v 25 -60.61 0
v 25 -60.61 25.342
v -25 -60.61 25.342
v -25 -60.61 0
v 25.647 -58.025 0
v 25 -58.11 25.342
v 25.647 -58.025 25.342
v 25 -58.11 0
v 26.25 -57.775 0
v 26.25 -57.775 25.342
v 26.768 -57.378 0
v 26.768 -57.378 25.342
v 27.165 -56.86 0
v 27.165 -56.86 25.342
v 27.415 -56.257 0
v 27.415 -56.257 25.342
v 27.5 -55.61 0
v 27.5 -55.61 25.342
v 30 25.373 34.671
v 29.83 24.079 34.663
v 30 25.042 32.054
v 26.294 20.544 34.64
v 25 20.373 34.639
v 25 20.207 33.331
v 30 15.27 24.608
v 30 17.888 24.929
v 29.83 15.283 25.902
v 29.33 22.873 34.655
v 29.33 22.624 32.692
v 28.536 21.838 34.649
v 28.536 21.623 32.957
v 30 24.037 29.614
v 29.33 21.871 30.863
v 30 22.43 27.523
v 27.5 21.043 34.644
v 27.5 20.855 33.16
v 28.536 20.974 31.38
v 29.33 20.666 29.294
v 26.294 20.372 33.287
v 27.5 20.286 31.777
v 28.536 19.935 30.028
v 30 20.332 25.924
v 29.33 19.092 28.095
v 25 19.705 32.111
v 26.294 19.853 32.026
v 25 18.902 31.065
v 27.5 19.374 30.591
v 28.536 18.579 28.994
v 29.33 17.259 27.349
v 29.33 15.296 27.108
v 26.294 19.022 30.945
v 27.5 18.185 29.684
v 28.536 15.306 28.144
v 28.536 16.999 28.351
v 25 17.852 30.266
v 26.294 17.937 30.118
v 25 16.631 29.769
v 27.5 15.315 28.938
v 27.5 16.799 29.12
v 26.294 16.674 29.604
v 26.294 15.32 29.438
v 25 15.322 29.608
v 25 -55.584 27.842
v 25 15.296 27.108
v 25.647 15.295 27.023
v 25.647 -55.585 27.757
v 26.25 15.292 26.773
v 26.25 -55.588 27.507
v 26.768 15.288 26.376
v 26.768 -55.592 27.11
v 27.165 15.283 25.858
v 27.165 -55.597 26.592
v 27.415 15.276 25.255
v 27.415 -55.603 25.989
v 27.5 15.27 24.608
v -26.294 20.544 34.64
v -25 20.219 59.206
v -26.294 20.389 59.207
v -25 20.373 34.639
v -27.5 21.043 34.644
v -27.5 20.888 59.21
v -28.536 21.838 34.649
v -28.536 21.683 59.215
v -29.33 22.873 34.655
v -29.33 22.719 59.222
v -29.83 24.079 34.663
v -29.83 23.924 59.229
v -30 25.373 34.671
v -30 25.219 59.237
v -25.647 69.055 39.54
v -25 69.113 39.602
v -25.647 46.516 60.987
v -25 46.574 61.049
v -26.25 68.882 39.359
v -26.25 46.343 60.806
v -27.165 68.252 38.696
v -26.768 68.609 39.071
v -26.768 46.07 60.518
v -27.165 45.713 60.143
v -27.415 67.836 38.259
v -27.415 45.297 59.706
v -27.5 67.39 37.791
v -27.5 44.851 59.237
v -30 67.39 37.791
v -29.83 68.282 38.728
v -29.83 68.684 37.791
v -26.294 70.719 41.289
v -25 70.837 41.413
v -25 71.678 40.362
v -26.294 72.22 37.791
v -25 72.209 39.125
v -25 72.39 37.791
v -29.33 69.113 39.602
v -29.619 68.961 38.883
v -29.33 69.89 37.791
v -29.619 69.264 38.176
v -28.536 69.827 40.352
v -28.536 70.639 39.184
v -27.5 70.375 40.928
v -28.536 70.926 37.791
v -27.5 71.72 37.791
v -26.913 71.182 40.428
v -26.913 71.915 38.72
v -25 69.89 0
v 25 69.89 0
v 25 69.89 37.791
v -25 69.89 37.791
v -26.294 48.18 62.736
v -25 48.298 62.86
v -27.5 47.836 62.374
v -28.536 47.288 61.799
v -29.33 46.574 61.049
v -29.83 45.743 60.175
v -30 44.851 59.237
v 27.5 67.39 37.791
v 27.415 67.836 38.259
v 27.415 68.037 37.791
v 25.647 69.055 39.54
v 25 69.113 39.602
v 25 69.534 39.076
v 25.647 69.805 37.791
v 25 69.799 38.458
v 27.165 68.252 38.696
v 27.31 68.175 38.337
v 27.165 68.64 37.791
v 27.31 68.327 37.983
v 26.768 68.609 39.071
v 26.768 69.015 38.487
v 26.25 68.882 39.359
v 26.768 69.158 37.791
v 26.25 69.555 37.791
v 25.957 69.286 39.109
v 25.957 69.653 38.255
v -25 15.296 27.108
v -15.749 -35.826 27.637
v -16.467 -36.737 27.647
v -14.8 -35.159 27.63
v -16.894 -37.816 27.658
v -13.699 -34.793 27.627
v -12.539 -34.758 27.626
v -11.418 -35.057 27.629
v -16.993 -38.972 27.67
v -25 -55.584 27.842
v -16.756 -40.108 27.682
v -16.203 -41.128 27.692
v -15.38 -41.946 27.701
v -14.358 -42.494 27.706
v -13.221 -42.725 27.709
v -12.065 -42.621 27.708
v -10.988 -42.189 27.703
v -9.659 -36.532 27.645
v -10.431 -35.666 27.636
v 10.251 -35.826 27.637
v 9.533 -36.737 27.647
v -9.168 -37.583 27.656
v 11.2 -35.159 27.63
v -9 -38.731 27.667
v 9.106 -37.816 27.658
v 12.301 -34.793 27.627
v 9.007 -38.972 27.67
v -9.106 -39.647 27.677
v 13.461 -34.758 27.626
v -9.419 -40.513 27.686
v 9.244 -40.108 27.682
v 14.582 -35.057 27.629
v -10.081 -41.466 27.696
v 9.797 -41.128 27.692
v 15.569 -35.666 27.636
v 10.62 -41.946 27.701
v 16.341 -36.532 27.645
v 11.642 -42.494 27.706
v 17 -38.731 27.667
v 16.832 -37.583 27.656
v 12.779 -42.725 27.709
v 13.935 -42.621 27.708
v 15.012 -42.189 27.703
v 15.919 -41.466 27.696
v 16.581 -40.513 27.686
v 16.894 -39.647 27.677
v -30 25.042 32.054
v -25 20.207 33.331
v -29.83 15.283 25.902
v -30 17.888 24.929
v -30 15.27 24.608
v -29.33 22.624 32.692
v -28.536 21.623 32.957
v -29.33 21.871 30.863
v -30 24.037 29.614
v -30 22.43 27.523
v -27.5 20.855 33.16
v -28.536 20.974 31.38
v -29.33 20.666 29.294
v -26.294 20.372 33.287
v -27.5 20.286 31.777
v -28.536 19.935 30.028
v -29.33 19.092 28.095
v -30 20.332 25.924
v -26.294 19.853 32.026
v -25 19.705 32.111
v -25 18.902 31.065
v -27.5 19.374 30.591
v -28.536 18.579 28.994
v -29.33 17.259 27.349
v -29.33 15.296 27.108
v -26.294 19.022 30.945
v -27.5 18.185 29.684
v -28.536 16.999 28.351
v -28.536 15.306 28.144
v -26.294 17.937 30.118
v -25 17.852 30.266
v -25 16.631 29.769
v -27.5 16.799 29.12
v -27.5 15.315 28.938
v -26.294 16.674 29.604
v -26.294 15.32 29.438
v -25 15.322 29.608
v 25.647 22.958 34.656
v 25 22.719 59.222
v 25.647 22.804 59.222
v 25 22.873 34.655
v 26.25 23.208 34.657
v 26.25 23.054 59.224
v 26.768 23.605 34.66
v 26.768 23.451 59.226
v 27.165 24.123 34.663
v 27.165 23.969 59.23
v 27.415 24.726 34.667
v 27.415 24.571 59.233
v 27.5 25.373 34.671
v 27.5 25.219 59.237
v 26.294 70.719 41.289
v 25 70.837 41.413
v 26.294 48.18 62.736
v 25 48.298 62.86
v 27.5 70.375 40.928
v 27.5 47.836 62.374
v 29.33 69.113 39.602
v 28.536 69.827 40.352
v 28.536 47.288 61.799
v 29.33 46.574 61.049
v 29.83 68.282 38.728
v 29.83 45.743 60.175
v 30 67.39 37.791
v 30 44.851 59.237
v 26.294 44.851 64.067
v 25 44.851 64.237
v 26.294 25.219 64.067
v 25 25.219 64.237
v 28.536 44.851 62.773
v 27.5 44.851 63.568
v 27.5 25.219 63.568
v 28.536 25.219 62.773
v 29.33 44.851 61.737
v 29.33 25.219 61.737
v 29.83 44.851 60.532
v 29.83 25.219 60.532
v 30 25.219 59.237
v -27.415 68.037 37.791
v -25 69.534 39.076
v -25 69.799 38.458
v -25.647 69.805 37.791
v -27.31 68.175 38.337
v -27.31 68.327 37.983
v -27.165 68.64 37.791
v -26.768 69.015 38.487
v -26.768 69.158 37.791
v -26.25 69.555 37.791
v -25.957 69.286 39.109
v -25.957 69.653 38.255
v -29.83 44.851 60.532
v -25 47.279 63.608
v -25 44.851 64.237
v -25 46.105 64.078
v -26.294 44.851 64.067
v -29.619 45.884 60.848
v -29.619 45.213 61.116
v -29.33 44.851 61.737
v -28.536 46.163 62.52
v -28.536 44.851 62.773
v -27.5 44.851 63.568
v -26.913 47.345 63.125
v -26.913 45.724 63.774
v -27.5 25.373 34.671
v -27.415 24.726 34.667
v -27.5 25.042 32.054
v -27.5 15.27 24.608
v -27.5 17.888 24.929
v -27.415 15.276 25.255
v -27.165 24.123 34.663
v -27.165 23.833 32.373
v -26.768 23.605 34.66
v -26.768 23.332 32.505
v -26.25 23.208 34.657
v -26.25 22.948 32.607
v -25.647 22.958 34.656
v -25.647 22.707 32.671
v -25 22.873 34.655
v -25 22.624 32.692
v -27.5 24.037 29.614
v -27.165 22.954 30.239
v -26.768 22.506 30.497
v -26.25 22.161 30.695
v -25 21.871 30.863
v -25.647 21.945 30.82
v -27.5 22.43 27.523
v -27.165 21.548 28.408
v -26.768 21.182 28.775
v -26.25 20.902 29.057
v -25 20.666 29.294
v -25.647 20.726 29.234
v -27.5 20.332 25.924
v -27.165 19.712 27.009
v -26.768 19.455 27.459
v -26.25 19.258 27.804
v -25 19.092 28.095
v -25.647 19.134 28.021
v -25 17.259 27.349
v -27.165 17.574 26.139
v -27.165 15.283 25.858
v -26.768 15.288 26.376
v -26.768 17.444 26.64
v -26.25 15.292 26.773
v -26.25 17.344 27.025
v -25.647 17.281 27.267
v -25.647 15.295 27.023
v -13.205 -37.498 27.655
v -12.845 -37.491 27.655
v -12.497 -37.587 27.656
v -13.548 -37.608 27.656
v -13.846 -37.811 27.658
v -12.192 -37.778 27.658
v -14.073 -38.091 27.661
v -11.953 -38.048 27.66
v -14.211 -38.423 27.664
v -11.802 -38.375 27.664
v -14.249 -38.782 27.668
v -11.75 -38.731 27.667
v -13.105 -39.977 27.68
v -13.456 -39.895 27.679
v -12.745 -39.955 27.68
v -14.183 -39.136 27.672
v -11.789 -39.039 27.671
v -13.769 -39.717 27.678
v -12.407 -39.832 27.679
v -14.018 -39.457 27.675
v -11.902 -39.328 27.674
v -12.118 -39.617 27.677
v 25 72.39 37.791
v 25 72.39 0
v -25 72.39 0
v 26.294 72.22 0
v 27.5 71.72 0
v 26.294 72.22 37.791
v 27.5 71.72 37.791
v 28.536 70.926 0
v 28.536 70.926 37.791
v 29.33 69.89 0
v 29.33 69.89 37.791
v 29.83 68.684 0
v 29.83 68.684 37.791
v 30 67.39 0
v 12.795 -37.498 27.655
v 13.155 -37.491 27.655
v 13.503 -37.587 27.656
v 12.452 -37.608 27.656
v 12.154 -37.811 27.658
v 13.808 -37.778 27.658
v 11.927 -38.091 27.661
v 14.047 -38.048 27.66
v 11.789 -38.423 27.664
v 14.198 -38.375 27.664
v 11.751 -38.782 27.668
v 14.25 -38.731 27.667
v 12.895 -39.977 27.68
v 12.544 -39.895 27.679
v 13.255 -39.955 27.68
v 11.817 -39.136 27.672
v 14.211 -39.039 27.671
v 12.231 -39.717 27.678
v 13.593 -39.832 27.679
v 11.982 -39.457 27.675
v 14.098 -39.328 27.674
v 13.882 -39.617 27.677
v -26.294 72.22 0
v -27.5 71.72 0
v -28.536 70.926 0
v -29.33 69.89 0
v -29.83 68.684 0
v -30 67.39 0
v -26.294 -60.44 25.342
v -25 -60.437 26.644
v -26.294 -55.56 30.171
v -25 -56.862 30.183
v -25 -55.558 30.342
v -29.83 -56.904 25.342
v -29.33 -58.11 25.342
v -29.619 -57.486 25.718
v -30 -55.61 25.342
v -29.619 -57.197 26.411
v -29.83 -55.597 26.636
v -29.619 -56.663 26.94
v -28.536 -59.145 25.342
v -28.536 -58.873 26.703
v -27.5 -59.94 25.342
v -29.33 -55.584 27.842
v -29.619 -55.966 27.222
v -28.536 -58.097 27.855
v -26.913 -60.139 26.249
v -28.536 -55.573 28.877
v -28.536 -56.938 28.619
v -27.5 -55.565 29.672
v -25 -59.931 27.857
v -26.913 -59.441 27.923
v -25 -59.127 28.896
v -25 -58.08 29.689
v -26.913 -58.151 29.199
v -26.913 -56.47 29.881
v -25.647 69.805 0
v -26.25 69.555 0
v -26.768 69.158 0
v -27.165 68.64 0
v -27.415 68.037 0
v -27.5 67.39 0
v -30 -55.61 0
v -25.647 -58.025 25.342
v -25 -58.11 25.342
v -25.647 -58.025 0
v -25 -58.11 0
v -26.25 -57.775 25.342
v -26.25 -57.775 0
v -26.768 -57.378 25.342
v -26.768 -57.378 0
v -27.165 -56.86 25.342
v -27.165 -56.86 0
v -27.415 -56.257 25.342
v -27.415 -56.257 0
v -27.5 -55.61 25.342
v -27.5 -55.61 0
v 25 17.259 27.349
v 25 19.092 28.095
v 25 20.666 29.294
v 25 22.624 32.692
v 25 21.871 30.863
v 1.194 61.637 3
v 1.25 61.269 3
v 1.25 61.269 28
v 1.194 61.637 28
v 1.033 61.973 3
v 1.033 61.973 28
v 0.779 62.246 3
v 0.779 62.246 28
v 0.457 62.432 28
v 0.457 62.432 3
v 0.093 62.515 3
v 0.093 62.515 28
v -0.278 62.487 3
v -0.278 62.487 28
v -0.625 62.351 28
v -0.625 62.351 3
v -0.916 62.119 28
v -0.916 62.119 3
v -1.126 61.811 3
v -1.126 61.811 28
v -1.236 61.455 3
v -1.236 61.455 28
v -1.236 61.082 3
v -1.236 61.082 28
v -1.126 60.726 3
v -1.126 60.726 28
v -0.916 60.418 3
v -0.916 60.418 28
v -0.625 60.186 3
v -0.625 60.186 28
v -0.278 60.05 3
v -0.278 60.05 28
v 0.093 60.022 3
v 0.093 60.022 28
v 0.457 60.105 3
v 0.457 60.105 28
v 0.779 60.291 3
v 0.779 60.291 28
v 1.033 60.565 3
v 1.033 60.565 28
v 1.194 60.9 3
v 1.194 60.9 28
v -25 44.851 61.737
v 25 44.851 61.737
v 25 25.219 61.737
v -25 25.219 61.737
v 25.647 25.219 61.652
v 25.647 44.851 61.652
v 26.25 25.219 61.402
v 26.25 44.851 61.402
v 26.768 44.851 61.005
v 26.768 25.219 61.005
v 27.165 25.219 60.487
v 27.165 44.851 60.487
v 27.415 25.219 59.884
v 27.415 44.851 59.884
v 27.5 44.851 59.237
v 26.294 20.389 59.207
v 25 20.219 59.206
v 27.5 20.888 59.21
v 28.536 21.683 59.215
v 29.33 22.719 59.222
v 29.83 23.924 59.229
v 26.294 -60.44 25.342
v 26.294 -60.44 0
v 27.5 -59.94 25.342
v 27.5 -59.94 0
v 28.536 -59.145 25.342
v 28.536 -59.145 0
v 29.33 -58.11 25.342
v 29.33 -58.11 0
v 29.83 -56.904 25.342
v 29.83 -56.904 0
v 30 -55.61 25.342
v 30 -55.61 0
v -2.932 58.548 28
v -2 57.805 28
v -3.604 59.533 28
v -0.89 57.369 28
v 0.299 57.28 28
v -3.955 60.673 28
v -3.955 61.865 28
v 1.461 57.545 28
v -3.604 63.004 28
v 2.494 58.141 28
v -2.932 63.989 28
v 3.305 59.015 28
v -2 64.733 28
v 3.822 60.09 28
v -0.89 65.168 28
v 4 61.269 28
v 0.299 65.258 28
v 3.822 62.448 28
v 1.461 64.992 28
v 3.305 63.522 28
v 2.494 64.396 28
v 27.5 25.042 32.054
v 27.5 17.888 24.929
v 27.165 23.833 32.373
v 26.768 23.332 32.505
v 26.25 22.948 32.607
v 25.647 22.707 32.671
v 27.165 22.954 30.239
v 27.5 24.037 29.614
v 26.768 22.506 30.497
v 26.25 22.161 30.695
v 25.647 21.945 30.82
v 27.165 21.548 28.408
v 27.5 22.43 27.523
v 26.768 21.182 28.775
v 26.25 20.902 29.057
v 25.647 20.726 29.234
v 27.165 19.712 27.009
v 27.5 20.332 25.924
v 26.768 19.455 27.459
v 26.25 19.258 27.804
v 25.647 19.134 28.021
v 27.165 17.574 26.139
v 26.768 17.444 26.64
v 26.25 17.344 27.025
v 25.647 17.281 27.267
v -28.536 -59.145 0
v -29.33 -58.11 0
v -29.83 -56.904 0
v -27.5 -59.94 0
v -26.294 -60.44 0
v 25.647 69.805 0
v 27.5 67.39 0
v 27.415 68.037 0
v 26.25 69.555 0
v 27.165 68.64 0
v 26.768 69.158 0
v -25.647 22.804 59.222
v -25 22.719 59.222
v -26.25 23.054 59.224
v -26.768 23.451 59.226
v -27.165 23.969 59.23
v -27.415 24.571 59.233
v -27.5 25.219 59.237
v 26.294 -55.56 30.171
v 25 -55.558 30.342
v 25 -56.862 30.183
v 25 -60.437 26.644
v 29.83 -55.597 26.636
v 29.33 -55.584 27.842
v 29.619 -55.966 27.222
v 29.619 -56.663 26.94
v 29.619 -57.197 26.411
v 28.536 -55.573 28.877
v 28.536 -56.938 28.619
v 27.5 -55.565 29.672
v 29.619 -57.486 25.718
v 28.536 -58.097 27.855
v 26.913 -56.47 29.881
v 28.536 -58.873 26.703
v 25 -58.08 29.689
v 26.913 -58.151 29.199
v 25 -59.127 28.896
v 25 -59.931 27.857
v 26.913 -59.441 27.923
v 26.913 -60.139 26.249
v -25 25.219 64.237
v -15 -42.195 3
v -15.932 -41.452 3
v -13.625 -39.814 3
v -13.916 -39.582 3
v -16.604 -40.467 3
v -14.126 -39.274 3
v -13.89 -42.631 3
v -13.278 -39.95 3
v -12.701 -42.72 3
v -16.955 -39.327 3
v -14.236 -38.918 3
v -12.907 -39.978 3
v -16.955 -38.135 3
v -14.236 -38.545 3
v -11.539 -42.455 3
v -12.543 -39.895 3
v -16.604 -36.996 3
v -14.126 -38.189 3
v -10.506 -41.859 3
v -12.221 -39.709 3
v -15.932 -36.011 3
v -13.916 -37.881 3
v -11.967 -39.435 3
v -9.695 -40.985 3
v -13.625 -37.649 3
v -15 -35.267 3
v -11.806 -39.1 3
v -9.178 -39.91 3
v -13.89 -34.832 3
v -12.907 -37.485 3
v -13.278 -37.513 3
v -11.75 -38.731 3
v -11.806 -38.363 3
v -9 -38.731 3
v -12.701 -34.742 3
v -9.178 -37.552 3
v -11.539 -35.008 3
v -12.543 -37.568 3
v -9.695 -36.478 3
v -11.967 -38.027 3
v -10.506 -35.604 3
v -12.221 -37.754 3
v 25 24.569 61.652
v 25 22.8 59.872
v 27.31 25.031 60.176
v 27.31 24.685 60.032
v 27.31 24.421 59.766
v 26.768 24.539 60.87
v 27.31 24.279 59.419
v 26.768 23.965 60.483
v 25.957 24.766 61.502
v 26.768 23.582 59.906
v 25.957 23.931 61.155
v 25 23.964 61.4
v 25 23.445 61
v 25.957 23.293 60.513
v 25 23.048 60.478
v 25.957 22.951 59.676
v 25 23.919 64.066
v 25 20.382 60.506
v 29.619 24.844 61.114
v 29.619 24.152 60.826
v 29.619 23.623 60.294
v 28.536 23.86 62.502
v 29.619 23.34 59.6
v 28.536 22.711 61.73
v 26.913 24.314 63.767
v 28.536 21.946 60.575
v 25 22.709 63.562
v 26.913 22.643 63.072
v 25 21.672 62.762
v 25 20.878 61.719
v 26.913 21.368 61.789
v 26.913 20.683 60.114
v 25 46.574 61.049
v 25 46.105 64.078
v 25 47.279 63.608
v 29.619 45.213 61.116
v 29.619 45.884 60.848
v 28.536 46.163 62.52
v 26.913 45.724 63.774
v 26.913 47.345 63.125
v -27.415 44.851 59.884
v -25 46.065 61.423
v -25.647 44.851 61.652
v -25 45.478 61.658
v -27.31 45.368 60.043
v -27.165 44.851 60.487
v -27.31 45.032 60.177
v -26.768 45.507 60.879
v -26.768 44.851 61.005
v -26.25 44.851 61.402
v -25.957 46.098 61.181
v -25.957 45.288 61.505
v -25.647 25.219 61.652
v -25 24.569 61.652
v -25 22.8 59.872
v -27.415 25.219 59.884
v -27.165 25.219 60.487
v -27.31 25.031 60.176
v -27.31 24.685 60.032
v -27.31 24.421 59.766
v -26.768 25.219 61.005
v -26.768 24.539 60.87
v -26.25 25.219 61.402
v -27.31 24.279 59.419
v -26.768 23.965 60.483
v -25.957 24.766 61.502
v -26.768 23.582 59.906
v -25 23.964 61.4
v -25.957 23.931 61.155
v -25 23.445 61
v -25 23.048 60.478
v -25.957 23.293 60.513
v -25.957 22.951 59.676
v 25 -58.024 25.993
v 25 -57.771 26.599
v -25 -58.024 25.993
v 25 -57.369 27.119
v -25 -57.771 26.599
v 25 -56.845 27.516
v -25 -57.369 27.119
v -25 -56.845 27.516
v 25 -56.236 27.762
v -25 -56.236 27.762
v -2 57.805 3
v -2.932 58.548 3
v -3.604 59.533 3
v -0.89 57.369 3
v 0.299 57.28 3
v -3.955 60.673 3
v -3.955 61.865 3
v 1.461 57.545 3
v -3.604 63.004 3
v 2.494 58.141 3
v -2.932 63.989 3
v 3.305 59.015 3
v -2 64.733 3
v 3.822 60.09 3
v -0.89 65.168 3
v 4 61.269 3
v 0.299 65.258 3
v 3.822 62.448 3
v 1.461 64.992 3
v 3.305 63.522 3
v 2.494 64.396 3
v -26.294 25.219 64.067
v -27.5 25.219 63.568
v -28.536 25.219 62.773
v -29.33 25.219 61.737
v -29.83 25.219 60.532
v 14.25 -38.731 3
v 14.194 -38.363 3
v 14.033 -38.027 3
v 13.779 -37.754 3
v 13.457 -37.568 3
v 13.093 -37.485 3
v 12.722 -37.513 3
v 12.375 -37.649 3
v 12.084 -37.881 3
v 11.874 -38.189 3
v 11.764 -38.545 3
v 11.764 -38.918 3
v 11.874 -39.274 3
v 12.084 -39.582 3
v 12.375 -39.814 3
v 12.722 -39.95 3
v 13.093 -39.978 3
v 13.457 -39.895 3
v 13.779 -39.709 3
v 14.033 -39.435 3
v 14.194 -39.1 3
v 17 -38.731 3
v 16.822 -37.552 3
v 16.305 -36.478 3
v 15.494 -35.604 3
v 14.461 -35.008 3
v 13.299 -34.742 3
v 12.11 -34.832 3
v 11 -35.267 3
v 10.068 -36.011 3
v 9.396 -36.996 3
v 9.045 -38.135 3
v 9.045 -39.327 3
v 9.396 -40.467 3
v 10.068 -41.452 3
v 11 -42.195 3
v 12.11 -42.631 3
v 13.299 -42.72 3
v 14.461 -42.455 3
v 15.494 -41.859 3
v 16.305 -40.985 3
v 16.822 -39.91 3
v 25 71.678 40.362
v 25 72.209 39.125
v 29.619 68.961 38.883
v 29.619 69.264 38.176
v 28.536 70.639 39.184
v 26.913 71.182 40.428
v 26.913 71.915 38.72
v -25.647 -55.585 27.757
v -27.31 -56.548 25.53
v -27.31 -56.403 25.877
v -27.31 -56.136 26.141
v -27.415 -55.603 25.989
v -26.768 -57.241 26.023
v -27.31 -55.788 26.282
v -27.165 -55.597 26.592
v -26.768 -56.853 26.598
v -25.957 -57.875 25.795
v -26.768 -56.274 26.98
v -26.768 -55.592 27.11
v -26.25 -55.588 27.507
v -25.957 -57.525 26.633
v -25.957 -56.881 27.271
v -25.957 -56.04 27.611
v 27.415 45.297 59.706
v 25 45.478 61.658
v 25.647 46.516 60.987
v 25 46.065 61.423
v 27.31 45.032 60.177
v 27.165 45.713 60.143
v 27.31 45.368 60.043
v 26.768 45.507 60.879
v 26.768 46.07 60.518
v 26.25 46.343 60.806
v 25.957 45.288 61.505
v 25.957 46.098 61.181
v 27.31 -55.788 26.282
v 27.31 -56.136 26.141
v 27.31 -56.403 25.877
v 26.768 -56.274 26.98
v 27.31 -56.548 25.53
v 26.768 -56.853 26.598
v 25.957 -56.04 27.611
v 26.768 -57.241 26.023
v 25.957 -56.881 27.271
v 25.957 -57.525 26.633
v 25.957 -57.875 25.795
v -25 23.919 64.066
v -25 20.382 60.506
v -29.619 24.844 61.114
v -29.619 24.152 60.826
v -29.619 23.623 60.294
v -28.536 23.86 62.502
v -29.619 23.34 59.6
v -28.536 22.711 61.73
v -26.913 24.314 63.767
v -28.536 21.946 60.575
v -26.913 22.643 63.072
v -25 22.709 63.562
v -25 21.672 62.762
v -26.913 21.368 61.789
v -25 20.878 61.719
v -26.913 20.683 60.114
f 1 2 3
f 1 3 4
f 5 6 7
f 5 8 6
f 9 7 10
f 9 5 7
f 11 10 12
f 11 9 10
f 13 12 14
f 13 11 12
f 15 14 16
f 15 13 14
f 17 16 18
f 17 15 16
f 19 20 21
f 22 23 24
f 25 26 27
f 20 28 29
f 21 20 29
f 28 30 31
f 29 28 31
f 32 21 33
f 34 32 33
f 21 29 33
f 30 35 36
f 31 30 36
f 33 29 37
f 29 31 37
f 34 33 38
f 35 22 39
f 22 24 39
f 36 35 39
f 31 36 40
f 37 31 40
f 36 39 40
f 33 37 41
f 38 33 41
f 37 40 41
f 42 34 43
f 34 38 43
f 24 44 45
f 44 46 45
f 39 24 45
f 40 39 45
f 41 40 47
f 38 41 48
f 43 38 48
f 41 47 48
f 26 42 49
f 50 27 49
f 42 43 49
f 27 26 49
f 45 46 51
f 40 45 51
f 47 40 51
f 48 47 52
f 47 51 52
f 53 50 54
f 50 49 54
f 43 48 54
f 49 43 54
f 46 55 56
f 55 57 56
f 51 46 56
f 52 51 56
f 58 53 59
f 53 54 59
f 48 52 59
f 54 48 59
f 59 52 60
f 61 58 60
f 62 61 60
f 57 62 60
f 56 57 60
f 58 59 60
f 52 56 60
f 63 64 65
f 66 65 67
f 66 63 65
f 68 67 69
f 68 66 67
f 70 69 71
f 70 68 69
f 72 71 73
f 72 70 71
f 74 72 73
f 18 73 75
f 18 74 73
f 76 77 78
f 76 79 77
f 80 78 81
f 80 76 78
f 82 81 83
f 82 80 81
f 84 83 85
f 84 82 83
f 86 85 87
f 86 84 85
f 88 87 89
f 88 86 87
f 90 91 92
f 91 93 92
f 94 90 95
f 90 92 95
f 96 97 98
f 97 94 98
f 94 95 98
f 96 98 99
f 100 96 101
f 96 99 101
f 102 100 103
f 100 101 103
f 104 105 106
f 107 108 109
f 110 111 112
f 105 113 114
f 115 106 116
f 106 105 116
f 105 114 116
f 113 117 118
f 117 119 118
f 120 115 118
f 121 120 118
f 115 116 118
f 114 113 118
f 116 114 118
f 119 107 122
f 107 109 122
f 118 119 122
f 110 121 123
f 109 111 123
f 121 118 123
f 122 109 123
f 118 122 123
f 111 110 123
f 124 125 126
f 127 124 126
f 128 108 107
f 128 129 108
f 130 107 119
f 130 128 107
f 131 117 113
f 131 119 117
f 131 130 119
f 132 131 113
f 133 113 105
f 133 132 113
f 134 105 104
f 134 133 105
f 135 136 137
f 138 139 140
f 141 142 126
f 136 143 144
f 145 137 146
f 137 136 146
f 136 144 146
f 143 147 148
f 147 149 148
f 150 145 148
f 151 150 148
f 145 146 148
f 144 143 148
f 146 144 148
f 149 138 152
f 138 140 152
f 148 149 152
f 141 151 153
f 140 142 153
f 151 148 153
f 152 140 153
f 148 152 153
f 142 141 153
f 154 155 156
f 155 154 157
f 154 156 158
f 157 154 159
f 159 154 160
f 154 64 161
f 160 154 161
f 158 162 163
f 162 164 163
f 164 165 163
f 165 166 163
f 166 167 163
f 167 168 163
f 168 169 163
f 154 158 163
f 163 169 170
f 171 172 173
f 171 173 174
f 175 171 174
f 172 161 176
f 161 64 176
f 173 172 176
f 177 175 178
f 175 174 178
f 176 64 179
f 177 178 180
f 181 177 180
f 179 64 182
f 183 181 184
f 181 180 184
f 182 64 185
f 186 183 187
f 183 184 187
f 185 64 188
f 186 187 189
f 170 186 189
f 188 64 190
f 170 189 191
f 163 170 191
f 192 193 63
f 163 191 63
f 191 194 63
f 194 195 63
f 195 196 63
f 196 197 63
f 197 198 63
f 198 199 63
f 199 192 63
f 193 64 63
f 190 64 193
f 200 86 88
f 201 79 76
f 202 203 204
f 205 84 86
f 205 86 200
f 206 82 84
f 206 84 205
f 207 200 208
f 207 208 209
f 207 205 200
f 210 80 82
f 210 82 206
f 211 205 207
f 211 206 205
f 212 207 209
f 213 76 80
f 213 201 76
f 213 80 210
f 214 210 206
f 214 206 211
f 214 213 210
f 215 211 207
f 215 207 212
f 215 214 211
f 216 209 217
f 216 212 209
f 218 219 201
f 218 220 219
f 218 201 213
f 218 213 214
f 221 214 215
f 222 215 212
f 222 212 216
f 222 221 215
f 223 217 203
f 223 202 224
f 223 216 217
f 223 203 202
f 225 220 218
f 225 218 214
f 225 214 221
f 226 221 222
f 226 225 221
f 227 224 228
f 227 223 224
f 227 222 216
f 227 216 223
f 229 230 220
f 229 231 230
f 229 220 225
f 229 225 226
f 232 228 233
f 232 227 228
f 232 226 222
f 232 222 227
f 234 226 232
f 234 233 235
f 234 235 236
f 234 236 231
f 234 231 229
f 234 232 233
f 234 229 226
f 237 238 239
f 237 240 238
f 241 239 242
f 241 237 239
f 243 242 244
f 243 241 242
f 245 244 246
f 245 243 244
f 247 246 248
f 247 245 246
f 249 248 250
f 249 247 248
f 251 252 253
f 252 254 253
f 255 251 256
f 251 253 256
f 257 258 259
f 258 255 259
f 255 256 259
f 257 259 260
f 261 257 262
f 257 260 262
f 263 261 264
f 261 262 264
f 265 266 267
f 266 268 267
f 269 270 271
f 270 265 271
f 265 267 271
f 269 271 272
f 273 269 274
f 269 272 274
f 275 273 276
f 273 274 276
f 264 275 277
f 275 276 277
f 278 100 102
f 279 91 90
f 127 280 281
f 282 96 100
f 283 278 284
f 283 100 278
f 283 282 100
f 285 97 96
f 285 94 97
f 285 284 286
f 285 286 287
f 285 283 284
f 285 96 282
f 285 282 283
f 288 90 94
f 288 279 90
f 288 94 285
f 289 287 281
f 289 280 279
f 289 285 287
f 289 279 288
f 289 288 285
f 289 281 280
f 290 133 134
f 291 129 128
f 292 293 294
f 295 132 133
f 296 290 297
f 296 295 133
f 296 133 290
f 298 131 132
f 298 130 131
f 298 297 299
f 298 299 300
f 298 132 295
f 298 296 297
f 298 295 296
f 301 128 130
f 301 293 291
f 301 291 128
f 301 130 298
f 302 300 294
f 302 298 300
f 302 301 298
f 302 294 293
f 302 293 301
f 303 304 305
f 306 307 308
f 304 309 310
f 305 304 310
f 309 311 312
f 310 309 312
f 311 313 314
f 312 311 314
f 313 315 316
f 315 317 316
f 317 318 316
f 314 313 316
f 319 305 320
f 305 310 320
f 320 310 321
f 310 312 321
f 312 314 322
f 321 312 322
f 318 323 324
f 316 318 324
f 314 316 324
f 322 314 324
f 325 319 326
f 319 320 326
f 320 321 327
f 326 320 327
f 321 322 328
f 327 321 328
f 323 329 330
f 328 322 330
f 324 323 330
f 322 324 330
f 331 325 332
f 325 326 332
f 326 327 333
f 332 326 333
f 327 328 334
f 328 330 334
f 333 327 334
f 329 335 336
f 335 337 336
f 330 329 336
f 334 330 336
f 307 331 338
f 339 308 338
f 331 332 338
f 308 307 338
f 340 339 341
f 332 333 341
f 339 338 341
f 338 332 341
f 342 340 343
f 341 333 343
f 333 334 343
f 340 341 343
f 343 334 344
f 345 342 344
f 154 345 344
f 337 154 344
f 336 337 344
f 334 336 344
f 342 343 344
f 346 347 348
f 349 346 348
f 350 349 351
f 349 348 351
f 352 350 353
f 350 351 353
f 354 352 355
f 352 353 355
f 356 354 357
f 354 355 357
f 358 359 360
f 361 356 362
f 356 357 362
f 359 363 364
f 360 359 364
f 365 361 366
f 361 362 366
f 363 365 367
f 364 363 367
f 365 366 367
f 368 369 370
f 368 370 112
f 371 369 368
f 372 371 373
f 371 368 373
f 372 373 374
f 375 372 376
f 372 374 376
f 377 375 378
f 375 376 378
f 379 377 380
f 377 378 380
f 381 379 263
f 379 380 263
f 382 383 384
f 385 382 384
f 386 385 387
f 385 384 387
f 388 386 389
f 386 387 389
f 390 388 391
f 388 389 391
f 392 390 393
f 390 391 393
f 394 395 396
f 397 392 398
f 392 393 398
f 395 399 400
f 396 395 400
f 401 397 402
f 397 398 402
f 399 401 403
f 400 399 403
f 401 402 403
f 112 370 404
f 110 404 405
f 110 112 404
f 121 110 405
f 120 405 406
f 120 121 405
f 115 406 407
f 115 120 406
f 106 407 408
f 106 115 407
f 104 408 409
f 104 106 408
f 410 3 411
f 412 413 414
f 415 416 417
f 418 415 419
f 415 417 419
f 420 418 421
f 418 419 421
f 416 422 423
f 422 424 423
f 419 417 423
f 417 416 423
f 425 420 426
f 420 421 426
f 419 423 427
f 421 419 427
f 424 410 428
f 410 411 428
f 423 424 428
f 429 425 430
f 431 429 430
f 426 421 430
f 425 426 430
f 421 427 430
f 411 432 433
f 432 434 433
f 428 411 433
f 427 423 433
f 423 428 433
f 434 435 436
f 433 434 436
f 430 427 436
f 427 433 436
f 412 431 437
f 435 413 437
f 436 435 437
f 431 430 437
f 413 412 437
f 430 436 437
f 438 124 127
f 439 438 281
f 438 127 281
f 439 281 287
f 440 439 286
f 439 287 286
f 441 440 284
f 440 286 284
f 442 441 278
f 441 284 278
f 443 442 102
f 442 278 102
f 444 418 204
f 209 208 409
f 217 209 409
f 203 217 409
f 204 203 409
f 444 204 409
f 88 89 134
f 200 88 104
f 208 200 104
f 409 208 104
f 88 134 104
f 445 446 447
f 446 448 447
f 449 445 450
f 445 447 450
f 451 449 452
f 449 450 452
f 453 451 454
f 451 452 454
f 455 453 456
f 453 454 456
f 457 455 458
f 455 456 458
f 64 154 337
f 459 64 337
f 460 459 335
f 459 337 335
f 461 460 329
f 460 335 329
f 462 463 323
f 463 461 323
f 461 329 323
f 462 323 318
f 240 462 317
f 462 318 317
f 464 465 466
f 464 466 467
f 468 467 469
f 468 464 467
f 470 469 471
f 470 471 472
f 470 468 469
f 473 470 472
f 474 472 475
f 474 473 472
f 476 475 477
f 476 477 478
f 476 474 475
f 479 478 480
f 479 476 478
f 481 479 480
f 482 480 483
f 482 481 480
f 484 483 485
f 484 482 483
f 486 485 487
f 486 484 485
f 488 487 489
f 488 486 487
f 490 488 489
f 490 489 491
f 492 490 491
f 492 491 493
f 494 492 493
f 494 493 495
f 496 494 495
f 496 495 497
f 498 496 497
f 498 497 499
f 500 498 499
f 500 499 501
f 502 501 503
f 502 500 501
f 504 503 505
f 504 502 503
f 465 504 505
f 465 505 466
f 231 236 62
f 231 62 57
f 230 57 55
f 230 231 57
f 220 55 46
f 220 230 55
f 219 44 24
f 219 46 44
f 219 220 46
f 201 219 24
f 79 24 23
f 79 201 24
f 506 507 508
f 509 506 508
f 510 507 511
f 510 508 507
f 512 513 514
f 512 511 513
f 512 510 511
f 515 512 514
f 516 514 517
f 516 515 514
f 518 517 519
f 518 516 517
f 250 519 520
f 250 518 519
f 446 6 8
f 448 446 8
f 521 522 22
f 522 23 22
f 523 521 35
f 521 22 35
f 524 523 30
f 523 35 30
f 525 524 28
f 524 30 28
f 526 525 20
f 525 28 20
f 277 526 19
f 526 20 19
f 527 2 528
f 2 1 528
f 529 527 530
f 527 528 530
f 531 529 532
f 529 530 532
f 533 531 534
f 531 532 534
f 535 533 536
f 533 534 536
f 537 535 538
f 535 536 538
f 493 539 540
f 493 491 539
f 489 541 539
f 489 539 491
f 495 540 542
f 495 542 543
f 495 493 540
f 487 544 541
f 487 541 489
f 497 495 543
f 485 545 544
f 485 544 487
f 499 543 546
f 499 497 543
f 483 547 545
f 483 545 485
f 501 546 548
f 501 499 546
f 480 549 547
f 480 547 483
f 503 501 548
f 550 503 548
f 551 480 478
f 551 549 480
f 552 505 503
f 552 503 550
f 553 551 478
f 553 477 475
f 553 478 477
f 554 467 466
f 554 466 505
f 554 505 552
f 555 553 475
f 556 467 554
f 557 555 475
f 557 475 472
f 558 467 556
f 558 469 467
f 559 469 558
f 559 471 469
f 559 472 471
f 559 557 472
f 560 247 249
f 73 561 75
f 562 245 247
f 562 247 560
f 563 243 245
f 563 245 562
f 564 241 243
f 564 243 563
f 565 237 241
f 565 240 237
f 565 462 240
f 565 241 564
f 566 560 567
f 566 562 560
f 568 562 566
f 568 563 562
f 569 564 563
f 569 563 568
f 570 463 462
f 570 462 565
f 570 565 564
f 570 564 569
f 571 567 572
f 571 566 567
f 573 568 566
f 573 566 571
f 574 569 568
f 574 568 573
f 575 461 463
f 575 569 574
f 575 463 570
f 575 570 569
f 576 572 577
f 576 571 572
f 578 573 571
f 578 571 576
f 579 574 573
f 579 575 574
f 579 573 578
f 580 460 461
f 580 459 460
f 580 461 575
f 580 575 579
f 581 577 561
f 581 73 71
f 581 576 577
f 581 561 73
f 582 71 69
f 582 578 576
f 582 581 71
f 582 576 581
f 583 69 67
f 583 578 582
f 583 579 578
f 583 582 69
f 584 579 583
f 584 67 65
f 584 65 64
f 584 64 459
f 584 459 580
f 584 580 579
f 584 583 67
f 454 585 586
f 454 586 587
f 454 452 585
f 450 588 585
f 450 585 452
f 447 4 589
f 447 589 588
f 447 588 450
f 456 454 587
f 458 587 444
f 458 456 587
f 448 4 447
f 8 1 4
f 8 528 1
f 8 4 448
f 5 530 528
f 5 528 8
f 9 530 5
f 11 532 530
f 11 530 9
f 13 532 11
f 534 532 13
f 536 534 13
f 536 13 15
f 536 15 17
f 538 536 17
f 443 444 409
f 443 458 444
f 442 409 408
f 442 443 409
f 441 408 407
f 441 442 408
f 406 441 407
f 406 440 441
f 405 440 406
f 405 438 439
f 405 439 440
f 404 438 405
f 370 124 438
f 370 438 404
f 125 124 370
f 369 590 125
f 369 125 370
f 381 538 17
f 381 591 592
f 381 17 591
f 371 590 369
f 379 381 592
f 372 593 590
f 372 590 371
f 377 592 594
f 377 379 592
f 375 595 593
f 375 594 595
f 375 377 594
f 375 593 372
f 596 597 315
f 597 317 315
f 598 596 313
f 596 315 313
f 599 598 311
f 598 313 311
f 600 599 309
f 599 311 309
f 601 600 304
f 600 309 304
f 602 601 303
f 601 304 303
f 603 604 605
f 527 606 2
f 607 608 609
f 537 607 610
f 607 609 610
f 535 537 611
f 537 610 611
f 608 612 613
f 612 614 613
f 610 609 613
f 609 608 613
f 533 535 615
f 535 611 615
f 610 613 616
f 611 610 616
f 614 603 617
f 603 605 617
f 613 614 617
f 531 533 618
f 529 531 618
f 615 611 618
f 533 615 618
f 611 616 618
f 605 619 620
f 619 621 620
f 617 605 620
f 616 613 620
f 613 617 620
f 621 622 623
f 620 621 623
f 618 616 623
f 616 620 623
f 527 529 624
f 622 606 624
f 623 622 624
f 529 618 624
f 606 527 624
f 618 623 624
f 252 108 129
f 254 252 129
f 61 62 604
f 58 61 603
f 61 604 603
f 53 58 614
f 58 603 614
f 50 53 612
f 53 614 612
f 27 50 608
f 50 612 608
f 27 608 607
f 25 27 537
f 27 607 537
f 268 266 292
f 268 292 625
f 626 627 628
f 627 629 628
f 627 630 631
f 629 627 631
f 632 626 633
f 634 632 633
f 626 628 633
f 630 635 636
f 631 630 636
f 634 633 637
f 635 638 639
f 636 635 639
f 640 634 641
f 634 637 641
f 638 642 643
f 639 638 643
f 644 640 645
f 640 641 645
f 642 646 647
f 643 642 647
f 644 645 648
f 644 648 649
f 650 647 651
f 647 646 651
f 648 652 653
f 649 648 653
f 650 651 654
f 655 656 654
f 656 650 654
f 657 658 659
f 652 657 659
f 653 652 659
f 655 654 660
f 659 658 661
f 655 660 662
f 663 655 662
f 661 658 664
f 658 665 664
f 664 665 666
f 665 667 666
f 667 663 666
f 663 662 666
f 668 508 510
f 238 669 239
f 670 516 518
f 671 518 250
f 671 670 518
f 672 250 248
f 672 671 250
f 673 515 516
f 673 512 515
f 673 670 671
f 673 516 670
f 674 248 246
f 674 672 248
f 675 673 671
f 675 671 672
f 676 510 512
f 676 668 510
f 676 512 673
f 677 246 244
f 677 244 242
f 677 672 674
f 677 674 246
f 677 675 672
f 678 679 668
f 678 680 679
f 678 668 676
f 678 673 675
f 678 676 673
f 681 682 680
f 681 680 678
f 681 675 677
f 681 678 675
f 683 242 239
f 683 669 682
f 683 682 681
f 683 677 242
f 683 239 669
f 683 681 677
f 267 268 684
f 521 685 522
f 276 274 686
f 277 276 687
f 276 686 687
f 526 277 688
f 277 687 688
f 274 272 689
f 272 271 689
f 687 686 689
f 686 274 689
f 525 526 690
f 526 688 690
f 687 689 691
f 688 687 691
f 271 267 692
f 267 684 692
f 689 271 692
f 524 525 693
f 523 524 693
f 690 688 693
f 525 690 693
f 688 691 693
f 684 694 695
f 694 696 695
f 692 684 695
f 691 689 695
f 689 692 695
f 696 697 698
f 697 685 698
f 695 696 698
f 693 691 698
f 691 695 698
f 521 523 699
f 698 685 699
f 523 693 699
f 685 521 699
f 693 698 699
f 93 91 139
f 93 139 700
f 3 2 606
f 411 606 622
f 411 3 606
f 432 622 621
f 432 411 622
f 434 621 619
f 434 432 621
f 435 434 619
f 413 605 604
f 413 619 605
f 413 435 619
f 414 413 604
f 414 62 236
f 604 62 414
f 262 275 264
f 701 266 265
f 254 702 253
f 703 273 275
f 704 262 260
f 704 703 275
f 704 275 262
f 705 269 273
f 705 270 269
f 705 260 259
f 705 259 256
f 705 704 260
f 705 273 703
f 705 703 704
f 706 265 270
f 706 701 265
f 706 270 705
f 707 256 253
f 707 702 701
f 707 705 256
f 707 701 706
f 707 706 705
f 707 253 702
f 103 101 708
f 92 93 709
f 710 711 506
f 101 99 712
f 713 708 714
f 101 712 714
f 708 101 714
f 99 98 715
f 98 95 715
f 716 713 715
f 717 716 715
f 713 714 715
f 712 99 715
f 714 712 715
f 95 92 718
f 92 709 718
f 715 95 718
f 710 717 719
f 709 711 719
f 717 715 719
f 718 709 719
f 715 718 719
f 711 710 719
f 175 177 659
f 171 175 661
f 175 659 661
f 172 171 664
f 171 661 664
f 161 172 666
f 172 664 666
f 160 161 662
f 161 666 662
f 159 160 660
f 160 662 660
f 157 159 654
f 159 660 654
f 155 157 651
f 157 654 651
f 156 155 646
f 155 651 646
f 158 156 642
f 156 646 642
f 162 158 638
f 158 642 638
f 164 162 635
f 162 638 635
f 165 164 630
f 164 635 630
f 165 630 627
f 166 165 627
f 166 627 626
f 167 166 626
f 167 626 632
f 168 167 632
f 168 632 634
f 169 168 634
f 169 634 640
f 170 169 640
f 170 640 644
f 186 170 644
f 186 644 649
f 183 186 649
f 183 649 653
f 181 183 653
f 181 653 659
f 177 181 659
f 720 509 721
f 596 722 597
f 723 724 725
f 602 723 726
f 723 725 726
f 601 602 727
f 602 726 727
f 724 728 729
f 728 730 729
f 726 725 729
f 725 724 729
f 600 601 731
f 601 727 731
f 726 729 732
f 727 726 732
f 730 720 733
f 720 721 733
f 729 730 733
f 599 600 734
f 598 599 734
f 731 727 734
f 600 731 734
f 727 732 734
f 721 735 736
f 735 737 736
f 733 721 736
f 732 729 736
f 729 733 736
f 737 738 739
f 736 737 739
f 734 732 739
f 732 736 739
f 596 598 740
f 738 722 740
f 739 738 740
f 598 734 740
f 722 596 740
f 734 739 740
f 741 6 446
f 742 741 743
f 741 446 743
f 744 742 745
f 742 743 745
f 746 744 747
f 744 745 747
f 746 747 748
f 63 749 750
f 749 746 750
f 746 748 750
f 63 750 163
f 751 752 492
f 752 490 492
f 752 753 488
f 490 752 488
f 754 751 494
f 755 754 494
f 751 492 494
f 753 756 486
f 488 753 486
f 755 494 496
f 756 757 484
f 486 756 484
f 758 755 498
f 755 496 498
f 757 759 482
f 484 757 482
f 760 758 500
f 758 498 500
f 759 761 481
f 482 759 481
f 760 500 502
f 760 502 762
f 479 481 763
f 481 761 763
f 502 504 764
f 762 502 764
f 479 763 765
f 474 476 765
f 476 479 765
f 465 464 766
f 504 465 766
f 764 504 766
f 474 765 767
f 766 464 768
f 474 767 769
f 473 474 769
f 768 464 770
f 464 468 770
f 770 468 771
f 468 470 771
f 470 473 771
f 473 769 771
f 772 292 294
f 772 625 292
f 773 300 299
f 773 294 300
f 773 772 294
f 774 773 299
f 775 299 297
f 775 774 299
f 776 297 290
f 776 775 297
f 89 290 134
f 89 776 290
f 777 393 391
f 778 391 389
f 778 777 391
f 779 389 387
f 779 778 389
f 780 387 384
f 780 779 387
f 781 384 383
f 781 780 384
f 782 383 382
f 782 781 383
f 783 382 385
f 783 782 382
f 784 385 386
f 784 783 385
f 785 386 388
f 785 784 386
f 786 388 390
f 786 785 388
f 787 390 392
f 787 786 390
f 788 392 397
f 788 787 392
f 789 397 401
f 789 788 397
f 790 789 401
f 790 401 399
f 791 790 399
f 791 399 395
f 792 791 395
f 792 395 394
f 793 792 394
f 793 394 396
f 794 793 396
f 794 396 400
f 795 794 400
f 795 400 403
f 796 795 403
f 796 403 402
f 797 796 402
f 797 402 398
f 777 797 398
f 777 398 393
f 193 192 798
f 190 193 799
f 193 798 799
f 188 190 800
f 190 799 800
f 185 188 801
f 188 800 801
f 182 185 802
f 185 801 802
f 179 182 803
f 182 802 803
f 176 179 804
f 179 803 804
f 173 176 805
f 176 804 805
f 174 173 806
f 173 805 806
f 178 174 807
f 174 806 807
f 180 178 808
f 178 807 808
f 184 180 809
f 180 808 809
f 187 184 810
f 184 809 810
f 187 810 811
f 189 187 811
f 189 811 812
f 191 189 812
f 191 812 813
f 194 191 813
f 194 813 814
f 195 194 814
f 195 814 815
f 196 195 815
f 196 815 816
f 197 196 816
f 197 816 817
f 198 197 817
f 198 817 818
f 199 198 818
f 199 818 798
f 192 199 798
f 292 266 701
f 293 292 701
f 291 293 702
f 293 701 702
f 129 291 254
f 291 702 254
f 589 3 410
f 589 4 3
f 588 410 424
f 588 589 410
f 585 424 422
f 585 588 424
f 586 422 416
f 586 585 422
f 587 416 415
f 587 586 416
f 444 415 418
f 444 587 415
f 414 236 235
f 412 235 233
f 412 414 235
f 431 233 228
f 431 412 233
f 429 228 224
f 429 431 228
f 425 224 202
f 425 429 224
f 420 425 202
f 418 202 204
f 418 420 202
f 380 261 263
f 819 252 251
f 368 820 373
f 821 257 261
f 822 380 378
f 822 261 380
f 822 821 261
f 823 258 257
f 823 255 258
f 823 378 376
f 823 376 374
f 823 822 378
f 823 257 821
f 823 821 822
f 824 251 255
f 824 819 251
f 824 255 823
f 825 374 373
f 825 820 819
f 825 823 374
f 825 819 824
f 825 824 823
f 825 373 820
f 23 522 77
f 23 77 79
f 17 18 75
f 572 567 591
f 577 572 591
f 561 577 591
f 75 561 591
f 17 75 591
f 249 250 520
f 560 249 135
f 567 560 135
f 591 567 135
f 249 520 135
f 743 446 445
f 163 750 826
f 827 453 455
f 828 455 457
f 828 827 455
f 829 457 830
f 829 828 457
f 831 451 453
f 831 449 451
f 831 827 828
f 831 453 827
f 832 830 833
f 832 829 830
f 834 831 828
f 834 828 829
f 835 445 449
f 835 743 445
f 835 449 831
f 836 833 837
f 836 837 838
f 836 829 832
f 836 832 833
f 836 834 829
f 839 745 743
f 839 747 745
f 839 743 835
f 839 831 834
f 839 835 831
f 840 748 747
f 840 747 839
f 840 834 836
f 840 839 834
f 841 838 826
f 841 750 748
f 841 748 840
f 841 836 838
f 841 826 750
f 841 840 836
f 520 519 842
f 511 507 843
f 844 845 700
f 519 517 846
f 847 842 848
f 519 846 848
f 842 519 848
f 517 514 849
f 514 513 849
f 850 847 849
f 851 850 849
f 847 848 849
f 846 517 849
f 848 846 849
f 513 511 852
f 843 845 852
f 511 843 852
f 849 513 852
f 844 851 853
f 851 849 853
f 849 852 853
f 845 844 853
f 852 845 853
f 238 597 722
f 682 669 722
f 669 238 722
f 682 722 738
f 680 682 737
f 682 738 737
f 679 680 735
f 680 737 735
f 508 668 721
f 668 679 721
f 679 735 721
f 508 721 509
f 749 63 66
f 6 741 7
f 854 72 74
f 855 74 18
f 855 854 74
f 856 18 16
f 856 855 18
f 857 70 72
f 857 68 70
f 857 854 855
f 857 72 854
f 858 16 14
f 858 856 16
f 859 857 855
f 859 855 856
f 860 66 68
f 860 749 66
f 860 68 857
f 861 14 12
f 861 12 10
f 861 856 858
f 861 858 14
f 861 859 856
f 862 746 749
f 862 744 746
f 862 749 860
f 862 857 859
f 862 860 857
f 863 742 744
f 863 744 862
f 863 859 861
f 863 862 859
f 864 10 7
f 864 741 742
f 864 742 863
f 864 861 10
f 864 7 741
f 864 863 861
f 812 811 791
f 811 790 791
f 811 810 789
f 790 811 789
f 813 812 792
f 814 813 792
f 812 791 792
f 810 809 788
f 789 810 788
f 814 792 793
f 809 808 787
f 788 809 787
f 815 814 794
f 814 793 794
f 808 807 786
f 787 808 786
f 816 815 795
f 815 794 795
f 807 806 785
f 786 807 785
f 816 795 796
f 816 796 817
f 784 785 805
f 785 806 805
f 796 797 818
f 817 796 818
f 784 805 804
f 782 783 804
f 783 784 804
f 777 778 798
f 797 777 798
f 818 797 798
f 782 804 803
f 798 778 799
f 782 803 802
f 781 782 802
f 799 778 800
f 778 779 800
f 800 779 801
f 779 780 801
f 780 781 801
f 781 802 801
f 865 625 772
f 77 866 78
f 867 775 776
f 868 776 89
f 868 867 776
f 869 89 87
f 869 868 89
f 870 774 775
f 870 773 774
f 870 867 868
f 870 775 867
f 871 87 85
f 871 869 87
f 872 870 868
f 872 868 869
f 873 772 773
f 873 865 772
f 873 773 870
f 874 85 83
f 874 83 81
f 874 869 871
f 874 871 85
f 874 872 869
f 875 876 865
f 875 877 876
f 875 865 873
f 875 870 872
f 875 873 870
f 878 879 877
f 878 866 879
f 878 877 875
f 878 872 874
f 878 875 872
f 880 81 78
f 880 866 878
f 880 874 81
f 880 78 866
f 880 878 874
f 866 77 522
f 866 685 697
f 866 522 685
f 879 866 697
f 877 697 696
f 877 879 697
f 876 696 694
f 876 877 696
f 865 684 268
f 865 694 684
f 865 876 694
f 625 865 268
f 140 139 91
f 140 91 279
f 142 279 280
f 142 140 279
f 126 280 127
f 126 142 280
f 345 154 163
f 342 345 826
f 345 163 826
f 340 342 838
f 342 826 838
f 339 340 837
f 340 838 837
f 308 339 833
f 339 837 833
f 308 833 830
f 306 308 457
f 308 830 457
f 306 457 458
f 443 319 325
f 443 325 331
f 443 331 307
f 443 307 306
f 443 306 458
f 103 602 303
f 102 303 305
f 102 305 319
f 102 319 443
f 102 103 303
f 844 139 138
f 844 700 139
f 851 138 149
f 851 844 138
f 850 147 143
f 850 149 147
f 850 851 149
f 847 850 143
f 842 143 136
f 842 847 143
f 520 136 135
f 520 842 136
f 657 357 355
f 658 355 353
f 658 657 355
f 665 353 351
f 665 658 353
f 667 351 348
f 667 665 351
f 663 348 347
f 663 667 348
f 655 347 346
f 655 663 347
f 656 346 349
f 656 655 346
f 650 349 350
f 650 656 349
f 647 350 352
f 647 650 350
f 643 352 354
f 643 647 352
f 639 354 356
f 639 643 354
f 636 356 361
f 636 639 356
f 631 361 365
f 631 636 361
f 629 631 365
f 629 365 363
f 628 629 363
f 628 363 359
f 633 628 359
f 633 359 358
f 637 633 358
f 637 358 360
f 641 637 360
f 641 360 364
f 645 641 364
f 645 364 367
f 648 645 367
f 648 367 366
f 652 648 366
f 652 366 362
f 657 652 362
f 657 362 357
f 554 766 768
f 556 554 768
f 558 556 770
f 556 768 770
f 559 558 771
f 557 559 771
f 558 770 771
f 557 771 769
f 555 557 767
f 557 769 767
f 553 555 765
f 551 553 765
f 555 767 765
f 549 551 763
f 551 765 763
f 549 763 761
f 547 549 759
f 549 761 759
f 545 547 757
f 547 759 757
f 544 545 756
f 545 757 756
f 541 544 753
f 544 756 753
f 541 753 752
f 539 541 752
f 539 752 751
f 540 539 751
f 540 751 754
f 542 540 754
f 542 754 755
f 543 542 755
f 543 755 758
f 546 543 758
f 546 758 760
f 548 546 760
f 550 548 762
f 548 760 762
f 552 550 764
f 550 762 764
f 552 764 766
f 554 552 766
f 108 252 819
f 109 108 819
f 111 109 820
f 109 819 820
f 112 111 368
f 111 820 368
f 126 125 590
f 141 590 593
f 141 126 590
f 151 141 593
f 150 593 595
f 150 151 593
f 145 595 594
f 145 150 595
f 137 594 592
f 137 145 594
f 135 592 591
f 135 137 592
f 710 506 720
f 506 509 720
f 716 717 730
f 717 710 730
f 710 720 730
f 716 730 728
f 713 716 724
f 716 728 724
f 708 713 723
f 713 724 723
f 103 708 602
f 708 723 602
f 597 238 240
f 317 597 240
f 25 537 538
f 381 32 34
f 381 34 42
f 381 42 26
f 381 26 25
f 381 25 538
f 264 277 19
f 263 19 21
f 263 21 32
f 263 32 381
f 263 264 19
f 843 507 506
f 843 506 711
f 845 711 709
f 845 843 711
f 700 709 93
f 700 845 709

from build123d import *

# Parameters (mm, degrees)
F3_DEPTH  = 30
F4_DEPTH  = 12.5
F5_DEPTH  = 12.5
F6_DEPTH  = 12.5
F7_DEPTH  = 12.5
F8_DEPTH  = 30
F9_R      = 5
F10_T     = -2.5
F2_R      = 4
F2_R_2    = 1.25
F11_DEPTH = 25


with BuildPart() as f3:
    # F0 (on Right) → F3 (new body, symmetric)
    with BuildSketch(Plane.YZ):
        with BuildLine():
            Line((-60.6099627912, 30.3939455835), (-60.6099627912, 0))
            Line((-60.6099627912, 0), (-40.8299627912, 0))
            ThreePointArc((-40.8299627912, 0), (-28.8299627912, 12), (-16.8299627912, 0))
            Line((-16.8299627912, 0), (30.5578776426, 0))
            ThreePointArc((30.5578776426, 0), (41.3865220854, 13.9579662735), (54.3900372088, 2))
            ThreePointArc((54.3900372088, 2), (54.3480034823, 0.9964848766), (54.222196775, 0))
            Line((54.222196775, 0), (72.3900372088, 0))
            Line((72.3900372088, 0), (72.3900372088, 39.934851595))
            Line((72.3900372088, 39.934851595), (46.8496945841, 64.2374157906))
            Line((46.8496945841, 64.2374157906), (20.1869886369, 64.2374157906))
            Line((20.1869886369, 64.2374157906), (20.4051136971, 29.5555796474))
            Line((20.4051136971, 29.5555796474), (-60.6099627912, 30.3939455835))
        make_face()
    extrude(amount=F3_DEPTH, both=True)

    # F0 (on Right) → F4 (join, symmetric)
    with BuildSketch(Plane.YZ):
        with BuildLine():
            Line((-60.6099627912, 30.3939455835), (-60.6099627912, 0))
            Line((-60.6099627912, 0), (-40.8299627912, 0))
            ThreePointArc((-40.8299627912, 0), (-28.8299627912, 12), (-16.8299627912, 0))
            Line((-16.8299627912, 0), (30.5578776426, 0))
            ThreePointArc((30.5578776426, 0), (41.3865220854, 13.9579662735), (54.3900372088, 2))
            ThreePointArc((54.3900372088, 2), (54.3480034823, 0.9964848766), (54.222196775, 0))
            Line((54.222196775, 0), (72.3900372088, 0))
            Line((72.3900372088, 0), (72.3900372088, 39.934851595))
            Line((72.3900372088, 39.934851595), (46.8496945841, 64.2374157906))
            Line((46.8496945841, 64.2374157906), (20.1869886369, 64.2374157906))
            Line((20.1869886369, 64.2374157906), (20.4051136971, 29.5555796474))
            Line((20.4051136971, 29.5555796474), (-60.6099627912, 30.3939455835))
        make_face()
    extrude(amount=F4_DEPTH, both=True)

    # F0 (on Right) → F5 (join, symmetric)
    with BuildSketch(Plane.YZ):
        with BuildLine():
            Line((-60.6099627912, 30.3939455835), (-60.6099627912, 0))
            Line((-60.6099627912, 0), (-40.8299627912, 0))
            ThreePointArc((-40.8299627912, 0), (-28.8299627912, 12), (-16.8299627912, 0))
            Line((-16.8299627912, 0), (30.5578776426, 0))
            ThreePointArc((30.5578776426, 0), (41.3865220854, 13.9579662735), (54.3900372088, 2))
            ThreePointArc((54.3900372088, 2), (54.3480034823, 0.9964848766), (54.222196775, 0))
            Line((54.222196775, 0), (72.3900372088, 0))
            Line((72.3900372088, 0), (72.3900372088, 39.934851595))
            Line((72.3900372088, 39.934851595), (46.8496945841, 64.2374157906))
            Line((46.8496945841, 64.2374157906), (20.1869886369, 64.2374157906))
            Line((20.1869886369, 64.2374157906), (20.4051136971, 29.5555796474))
            Line((20.4051136971, 29.5555796474), (-60.6099627912, 30.3939455835))
        make_face()
    extrude(amount=F5_DEPTH, both=True)

    # F0 (on Right) → F6 (join, symmetric)
    with BuildSketch(Plane.YZ):
        with BuildLine():
            Line((-60.6099627912, 30.3939455835), (-60.6099627912, 0))
            Line((-60.6099627912, 0), (-40.8299627912, 0))
            ThreePointArc((-40.8299627912, 0), (-28.8299627912, 12), (-16.8299627912, 0))
            Line((-16.8299627912, 0), (30.5578776426, 0))
            ThreePointArc((30.5578776426, 0), (41.3865220854, 13.9579662735), (54.3900372088, 2))
            ThreePointArc((54.3900372088, 2), (54.3480034823, 0.9964848766), (54.222196775, 0))
            Line((54.222196775, 0), (72.3900372088, 0))
            Line((72.3900372088, 0), (72.3900372088, 39.934851595))
            Line((72.3900372088, 39.934851595), (46.8496945841, 64.2374157906))
            Line((46.8496945841, 64.2374157906), (20.1869886369, 64.2374157906))
            Line((20.1869886369, 64.2374157906), (20.4051136971, 29.5555796474))
            Line((20.4051136971, 29.5555796474), (-60.6099627912, 30.3939455835))
        make_face()
    extrude(amount=F6_DEPTH, both=True)

    # F0 (on Right) → F7 (join, symmetric)
    with BuildSketch(Plane.YZ):
        with BuildLine():
            Line((-60.6099627912, 30.3939455835), (-60.6099627912, 0))
            Line((-60.6099627912, 0), (-40.8299627912, 0))
            ThreePointArc((-40.8299627912, 0), (-28.8299627912, 12), (-16.8299627912, 0))
            Line((-16.8299627912, 0), (30.5578776426, 0))
            ThreePointArc((30.5578776426, 0), (41.3865220854, 13.9579662735), (54.3900372088, 2))
            ThreePointArc((54.3900372088, 2), (54.3480034823, 0.9964848766), (54.222196775, 0))
            Line((54.222196775, 0), (72.3900372088, 0))
            Line((72.3900372088, 0), (72.3900372088, 39.934851595))
            Line((72.3900372088, 39.934851595), (46.8496945841, 64.2374157906))
            Line((46.8496945841, 64.2374157906), (20.1869886369, 64.2374157906))
            Line((20.1869886369, 64.2374157906), (20.4051136971, 29.5555796474))
            Line((20.4051136971, 29.5555796474), (-60.6099627912, 30.3939455835))
        make_face()
    extrude(amount=F7_DEPTH, both=True)

    # F0 (on Right) → F8 (join, symmetric)
    with BuildSketch(Plane.YZ):
        with BuildLine():
            ThreePointArc((-16.8299627912, 0), (-28.8299627912, 12), (-40.8299627912, 0))
            Line((-40.8299627912, 0), (-16.8299627912, 0))
        make_face()
        with BuildLine():
            ThreePointArc((54.3900372088, 2), (41.3865220854, 13.9579662735), (30.5578776426, 0))
            Line((30.5578776426, 0), (54.222196775, 0))
            ThreePointArc((54.222196775, 0), (54.3480034823, 0.9964848766), (54.3900372088, 2))
        make_face()
    extrude(amount=F8_DEPTH, both=True)

    # F9
    f9_edges = [f3.edges().sort_by_distance(p)[0] for p in [
        (-30, -20.102425, 29.974763),
        (0, -60.609963, 30.393946),
        (30, -20.102425, 29.974763),
        (0, 20.405114, 29.55558),
        (0, 20.186989, 64.237416),
        (-30, 33.518342, 64.237416),
        (0, 46.849695, 64.237416),
        (30, 33.518342, 64.237416),
        (-30, -60.609963, 15.196973),
        (30, -60.609963, 15.196973),
        (-30, 59.619866, 52.086134),
        (-30, 72.390037, 19.967426),
        (0, 72.390037, 39.934852),
        (30, 59.619866, 52.086134),
        (30, 72.390037, 19.967426),
        (30, 20.296051, 46.896498),
        (-30, 20.296051, 46.896498),
    ]]
    fillet(f9_edges, radius=F9_R)

    # F10
    f10_openings = [f3.faces().sort_by_distance(p)[0] for p in [
        (0, 5.890037, 0),
    ]]
    offset(amount=F10_T, openings=f10_openings)

    # F2 (on offset) → F11, piece 2 (join)
    with BuildSketch(Plane.XY.offset(3)):
        with Locations((13, -38.7313138237)):
            Circle(F2_R)
        with Locations((13, -38.7313138237)):
            Circle(F2_R_2, mode=Mode.SUBTRACT)
        with Locations((-13, -38.7313138237)):
            Circle(F2_R)
        with Locations((-13, -38.7313138237)):
            Circle(F2_R_2, mode=Mode.SUBTRACT)
    extrude(amount=F11_DEPTH)


with BuildPart() as f11:
    # F2 (on offset) → F11 (new body)
    with BuildSketch(Plane.XY.offset(3)):
        with Locations((0, 61.2686861763)):
            Circle(F2_R)
        with Locations((0, 61.2686861763)):
            Circle(F2_R_2, mode=Mode.SUBTRACT)
    extrude(amount=F11_DEPTH)


solid = Compound([f3.part, f11.part])
